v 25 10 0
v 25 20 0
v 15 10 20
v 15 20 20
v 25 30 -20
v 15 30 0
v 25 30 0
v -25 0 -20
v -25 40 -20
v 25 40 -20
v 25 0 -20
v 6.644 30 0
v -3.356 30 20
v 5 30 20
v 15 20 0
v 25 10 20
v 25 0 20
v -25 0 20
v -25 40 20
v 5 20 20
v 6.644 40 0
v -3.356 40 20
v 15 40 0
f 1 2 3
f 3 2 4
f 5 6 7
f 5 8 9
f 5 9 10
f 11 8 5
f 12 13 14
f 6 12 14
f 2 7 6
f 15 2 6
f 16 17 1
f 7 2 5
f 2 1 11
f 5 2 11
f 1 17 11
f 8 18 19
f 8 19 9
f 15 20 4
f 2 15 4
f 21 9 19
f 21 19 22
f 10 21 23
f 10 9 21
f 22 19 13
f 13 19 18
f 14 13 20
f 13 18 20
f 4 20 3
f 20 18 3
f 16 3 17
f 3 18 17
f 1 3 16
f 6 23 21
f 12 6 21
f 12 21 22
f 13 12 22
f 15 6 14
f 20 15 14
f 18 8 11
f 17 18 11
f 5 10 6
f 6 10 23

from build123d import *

# Parameters (mm, degrees)
SKETCH1_W           = 50
SKETCH1_H           = 40
BOSS_EXTRUDE1_DEPTH = 40
CUT_EXTRUDE1_DEPTH  = 30
CUT_EXTRUDE2_DEPTH  = 20
CUT_EXTRUDE3_DEPTH  = 10
CUT_EXTRUDE4_DEPTH  = 10


with BuildPart() as part:
    # Sketch1 → Boss-Extrude1 (new body)
    with BuildSketch(Plane(origin=(0, 0, 0), x_dir=(1, 0, 0), z_dir=(0, 1, 0))):
        Rectangle(SKETCH1_W, SKETCH1_H)
    extrude(amount=BOSS_EXTRUDE1_DEPTH)

    # Sketch2 → Cut-Extrude1 (cut)
    with BuildSketch(Plane(origin=(0, 40, 0), x_dir=(1, 0, 0), z_dir=(0, 1, 0))):
        Polygon((25, 0), (15, -20), (25, -20), align=None)
    extrude(amount=-CUT_EXTRUDE1_DEPTH, mode=Mode.SUBTRACT)

    # Sketch3 → Cut-Extrude2 (cut)
    with BuildSketch(Plane(origin=(0, 40, 0), x_dir=(1, 0, 0), z_dir=(0, 1, 0))):
        Polygon((15, 0), (5, -20), (15, -20), (25, 0), align=None)
    extrude(amount=-CUT_EXTRUDE2_DEPTH, mode=Mode.SUBTRACT)

    # Sketch4 → Cut-Extrude3 (cut)
    with BuildSketch(Plane(origin=(0, 40, 0), x_dir=(1, 0, 0), z_dir=(0, 1, 0))):
        Polygon((25, 20), (15, 0), (25, 0), align=None)
    extrude(amount=-CUT_EXTRUDE3_DEPTH, mode=Mode.SUBTRACT)

    # Sketch5 → Cut-Extrude4 (cut)
    with BuildSketch(Plane(origin=(0, 40, 0), x_dir=(1, 0, 0), z_dir=(0, 1, 0))):
        Polygon((15, 0), (6.643581927, 0), (-3.356418073, -20), (5, -20), align=None)
    extrude(amount=-CUT_EXTRUDE4_DEPTH, mode=Mode.SUBTRACT)


solid = part.part
